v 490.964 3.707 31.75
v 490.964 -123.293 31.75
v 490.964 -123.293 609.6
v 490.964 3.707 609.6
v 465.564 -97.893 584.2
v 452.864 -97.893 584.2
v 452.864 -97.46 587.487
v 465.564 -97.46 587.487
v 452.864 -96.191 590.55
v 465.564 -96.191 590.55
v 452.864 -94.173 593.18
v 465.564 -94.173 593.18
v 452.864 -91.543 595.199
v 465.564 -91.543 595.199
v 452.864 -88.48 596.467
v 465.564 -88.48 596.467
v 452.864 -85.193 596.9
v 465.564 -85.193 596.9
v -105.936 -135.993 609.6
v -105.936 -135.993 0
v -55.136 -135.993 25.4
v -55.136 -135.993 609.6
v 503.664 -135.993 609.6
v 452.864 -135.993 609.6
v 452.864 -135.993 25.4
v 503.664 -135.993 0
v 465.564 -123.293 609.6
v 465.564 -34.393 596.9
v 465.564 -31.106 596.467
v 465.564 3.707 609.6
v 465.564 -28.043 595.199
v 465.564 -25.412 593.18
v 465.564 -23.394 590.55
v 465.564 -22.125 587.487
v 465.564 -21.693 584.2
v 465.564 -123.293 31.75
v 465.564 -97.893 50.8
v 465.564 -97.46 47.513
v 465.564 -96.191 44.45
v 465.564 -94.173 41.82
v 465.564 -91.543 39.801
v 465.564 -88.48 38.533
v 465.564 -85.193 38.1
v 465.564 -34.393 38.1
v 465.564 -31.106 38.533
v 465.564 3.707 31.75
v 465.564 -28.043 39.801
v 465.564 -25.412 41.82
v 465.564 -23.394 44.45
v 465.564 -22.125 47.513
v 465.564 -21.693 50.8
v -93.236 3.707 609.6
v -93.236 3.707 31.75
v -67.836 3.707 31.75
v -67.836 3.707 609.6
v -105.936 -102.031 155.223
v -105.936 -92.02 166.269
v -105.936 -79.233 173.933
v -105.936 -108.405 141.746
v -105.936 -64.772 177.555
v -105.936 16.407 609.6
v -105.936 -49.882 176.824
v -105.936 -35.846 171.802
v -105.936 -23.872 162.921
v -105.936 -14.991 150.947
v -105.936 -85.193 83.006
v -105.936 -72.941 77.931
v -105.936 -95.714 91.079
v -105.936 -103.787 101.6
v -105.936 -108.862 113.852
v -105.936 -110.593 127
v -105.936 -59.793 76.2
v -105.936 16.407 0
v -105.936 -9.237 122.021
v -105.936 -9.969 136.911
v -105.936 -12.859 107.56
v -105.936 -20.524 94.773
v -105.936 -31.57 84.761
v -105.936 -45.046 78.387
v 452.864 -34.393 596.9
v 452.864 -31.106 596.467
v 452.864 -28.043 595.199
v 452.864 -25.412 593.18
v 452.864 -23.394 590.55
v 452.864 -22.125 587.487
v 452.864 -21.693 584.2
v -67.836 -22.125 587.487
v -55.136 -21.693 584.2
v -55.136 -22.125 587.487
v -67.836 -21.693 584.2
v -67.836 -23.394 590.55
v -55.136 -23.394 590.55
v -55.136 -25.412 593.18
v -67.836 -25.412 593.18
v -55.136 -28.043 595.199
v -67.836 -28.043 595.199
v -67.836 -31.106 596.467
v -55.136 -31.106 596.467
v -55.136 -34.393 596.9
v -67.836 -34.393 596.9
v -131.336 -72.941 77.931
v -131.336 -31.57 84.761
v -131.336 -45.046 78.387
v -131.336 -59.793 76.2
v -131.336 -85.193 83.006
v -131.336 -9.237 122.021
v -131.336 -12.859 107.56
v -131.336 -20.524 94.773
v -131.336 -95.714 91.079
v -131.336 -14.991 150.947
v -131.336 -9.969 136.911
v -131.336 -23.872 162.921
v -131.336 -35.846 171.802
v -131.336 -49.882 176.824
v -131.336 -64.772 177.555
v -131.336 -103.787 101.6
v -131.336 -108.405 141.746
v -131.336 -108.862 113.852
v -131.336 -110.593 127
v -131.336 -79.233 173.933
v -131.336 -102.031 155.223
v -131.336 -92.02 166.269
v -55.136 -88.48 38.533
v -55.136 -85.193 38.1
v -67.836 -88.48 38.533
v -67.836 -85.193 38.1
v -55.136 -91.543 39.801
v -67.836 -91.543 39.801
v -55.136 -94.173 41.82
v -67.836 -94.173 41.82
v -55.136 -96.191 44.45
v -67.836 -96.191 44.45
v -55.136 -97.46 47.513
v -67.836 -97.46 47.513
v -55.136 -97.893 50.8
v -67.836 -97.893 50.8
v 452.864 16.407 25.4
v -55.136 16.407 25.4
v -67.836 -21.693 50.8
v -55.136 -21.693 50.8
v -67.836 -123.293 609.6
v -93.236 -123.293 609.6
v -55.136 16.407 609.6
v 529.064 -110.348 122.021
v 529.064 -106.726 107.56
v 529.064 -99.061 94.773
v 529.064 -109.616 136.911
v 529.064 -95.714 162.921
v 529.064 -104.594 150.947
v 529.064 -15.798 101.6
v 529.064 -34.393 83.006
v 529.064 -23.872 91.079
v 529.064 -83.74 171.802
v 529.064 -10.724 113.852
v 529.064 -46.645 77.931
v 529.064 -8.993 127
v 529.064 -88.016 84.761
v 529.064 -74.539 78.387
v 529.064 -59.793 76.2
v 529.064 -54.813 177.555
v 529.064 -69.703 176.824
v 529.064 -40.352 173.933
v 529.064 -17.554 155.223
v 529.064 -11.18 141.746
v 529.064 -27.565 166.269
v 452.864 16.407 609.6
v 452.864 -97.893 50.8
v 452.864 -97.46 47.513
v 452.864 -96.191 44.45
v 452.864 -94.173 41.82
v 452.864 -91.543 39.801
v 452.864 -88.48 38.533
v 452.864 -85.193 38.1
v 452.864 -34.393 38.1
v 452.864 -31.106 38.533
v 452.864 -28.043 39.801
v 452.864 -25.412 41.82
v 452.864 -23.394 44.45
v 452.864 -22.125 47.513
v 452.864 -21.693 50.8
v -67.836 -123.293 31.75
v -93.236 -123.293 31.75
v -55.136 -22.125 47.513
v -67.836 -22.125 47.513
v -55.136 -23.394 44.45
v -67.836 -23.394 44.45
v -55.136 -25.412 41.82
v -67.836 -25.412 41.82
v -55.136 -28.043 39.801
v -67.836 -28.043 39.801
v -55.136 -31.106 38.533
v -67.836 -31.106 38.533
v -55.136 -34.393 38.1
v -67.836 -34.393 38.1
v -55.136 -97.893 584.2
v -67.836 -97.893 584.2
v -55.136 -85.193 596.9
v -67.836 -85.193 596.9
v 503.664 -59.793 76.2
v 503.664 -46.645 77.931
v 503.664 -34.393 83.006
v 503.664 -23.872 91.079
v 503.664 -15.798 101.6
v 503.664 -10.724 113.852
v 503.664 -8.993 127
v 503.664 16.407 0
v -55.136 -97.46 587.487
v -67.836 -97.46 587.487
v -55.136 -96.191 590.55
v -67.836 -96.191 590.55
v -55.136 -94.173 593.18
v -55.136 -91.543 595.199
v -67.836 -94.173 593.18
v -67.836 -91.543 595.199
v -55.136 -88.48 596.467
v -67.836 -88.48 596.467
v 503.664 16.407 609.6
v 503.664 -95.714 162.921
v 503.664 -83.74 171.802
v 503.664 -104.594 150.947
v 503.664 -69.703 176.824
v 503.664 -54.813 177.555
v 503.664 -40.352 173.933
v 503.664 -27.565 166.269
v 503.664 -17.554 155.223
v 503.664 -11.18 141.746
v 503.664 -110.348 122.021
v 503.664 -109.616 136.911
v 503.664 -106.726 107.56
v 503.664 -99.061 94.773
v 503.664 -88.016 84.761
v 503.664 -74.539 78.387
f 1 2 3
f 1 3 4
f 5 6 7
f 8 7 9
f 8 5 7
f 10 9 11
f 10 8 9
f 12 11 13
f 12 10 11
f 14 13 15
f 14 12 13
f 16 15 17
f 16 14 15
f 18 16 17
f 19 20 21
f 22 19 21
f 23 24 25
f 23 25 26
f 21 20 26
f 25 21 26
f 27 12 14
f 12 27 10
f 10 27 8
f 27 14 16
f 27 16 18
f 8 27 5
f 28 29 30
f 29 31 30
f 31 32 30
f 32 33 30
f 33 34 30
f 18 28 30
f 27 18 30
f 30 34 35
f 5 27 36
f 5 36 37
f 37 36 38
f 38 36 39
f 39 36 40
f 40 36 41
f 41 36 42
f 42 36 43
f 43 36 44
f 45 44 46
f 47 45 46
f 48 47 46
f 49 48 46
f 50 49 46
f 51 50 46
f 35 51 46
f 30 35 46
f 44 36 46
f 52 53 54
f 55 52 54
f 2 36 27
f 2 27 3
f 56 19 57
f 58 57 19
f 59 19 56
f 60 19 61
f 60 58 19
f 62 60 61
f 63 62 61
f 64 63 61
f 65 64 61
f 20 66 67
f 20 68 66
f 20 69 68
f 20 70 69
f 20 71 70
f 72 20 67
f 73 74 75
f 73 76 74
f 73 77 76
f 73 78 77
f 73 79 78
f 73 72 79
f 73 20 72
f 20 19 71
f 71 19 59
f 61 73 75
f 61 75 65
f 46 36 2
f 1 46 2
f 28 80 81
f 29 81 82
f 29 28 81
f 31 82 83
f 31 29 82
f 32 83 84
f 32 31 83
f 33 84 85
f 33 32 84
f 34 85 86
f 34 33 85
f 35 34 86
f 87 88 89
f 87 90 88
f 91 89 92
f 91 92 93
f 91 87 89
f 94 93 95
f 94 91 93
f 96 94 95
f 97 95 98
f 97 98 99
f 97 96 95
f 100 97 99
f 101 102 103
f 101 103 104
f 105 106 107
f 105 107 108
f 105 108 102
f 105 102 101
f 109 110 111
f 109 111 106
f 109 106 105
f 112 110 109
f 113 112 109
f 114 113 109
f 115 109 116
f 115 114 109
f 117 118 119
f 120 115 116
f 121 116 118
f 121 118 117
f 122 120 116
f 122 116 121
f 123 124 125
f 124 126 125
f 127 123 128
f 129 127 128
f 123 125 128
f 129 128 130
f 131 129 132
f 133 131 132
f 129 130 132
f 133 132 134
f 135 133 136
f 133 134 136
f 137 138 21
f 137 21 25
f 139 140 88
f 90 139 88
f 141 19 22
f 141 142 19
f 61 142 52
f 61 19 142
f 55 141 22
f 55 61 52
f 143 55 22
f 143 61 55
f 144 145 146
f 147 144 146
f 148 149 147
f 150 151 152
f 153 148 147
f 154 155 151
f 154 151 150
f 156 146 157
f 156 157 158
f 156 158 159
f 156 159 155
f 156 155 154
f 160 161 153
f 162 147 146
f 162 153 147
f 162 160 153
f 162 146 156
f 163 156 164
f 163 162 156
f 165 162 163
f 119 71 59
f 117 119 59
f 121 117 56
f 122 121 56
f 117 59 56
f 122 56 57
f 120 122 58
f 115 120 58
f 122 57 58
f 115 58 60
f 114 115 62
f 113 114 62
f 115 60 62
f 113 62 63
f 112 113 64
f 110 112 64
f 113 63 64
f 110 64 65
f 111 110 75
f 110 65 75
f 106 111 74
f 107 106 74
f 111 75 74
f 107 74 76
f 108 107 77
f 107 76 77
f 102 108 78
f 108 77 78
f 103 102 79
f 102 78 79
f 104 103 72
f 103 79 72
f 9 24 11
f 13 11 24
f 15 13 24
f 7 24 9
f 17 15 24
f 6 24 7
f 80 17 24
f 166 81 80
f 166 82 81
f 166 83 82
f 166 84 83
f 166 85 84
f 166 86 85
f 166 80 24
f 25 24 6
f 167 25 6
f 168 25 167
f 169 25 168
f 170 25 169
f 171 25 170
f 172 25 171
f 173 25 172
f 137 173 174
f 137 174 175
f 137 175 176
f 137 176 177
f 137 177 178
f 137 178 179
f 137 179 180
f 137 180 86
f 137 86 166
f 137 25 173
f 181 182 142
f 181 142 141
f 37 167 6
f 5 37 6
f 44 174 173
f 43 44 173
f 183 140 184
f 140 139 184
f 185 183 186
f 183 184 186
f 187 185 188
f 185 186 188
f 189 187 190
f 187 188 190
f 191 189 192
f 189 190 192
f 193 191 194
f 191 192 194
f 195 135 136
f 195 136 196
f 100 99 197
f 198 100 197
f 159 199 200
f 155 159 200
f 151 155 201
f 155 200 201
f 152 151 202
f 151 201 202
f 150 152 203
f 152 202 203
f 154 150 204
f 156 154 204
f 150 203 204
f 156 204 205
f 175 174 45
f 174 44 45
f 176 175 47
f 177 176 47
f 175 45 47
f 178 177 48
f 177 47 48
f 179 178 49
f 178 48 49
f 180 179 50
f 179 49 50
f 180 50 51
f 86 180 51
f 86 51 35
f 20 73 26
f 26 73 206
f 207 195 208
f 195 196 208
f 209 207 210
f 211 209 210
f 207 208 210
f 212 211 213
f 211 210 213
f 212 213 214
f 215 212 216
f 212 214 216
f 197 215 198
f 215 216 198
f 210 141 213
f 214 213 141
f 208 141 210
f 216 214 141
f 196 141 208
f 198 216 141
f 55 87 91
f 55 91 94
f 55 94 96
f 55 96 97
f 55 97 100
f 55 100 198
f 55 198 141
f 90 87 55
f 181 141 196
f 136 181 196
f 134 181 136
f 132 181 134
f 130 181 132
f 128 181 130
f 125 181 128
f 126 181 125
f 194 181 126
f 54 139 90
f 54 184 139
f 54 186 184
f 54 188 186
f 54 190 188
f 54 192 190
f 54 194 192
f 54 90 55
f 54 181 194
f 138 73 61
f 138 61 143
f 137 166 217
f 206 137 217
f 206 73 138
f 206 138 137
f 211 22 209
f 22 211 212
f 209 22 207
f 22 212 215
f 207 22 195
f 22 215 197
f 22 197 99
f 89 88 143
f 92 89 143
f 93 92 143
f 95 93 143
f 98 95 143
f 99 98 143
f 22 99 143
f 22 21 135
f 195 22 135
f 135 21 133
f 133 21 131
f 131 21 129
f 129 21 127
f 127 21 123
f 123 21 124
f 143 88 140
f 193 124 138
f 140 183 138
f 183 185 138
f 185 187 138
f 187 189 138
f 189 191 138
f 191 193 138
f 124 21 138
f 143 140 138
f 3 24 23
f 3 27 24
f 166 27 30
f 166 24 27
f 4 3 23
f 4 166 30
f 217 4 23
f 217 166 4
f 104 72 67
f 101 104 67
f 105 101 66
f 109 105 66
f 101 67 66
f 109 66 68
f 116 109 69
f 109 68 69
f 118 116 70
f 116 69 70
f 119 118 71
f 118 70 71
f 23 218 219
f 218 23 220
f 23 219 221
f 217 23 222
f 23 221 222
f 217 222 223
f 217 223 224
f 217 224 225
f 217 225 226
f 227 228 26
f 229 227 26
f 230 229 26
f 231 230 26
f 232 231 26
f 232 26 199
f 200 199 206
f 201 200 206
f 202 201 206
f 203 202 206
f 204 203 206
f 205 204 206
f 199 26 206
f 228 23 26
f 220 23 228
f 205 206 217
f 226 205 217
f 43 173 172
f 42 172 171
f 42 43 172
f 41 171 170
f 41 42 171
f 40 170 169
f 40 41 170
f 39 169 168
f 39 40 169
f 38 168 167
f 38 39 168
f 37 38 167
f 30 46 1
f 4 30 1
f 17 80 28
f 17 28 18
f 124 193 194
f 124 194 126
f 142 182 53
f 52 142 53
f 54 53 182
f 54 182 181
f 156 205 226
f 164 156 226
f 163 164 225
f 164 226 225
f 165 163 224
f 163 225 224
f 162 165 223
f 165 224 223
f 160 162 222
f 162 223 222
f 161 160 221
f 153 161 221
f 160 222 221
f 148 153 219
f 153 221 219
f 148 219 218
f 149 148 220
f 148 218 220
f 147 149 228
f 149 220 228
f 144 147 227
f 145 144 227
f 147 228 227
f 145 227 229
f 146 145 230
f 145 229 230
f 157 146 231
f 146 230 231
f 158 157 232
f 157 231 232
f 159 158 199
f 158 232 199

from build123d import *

# Parameters (mm, degrees)
F0_W          = 25.4
F0_H          = 127
F1_DEPTH      = 31.75
F0_W_2        = 50.8
F0_H_2        = 152.4
F2_DEPTH      = 609.6
F0_W_3        = 508
F3_DEPTH      = 25.4
F4_DEPTH      = 609.6
F5_DEPTH      = 31.75
F6_W          = 76.2
F6_H          = 558.8
F7_DEPTH      = 25.4
F7_DEPTH_BACK = 533.4
F8_R          = 12.7
F10_DEPTH     = 25.4
F12_DEPTH     = 25.4


with BuildPart() as f1:
    # F0 (on Top) → F1 (new body)
    with BuildSketch(Plane.XY):
        with Locations((-80.5362447441, -59.7925535809)):
            Rectangle(F0_W, F0_H)
    extrude(amount=F1_DEPTH)

    # F0 (on Top) → F2 (join)
    with BuildSketch(Plane.XY):
        with Locations((-80.5362447441, -59.7925535809)):
            Rectangle(F0_W_2, F0_H_2)
        with Locations((-80.5362447441, -59.7925535809)):
            Rectangle(F0_W, F0_H, mode=Mode.SUBTRACT)
    extrude(amount=F2_DEPTH)

    # F0 (on Top) → F3 (join)
    with BuildSketch(Plane.XY):
        with Locations((198.8637552559, -59.7925535809)):
            Rectangle(F0_W_3, F0_H_2)
    extrude(amount=F3_DEPTH)

    # F0 (on Top) → F4 (join)
    with BuildSketch(Plane.XY):
        with Locations((478.2637552559, -59.7925535809)):
            Rectangle(F0_W_2, F0_H_2)
        with Locations((478.2637552559, -59.7925535809)):
            Rectangle(F0_W, F0_H, mode=Mode.SUBTRACT)
    extrude(amount=F4_DEPTH)

    # F0 (on Top) → F5 (join)
    with BuildSketch(Plane.XY):
        with Locations((478.2637552559, -59.7925535809)):
            Rectangle(F0_W, F0_H)
    extrude(amount=F5_DEPTH)

    # F6 (on face) → F7 (cut, two sides)
    with BuildSketch(Plane(origin=(452.8637552559, 0, 0), x_dir=(0, -1, 0), z_dir=(-1, 0, 0))) as f7_sk:
        with Locations((59.7925535809, 317.5)):
            Rectangle(F6_W, F6_H)
    extrude(amount=-F7_DEPTH, mode=Mode.SUBTRACT)
    extrude(f7_sk.sketch, amount=F7_DEPTH_BACK, mode=Mode.SUBTRACT)

    # F8
    f8_edges = [f1.edges().sort_by_distance(p)[0] for p in [
        (459.213755, -97.892554, 38.1),
        (459.213755, -21.692554, 38.1),
        (459.213755, -97.892554, 596.9),
        (459.213755, -21.692554, 596.9),
        (-61.486245, -21.692554, 38.1),
        (-61.486245, -21.692554, 596.9),
        (-61.486245, -97.892554, 596.9),
        (-61.486245, -97.892554, 38.1),
    ]]
    fillet(f8_edges, radius=F8_R)

    # F9 (on face) → F10 (join)
    with BuildSketch(Plane(origin=(-105.9362447441, 0, 0), x_dir=(0, -1, 0), z_dir=(-1, 0, 0))):
        with BuildLine():
            ThreePointArc((59.7925535809, 76.2), (95.7135780651, 91.0789755157), (110.5925535809, 127))
            ThreePointArc((110.5925535809, 127), (23.8715290966, 162.9210244843), (59.7925535809, 76.2))
        make_face()
    extrude(amount=F10_DEPTH)

    # F11 (on face) → F12 (join)
    with BuildSketch(Plane.YZ.offset(503.6637552559)):
        with BuildLine():
            ThreePointArc((-8.9925535809, 127), (-95.7135780651, 162.9210244843), (-59.7925535809, 76.2))
            ThreePointArc((-59.7925535809, 76.2), (-23.8715290966, 91.0789755157), (-8.9925535809, 127))
        make_face()
    extrude(amount=F12_DEPTH)


solid = f1.part
